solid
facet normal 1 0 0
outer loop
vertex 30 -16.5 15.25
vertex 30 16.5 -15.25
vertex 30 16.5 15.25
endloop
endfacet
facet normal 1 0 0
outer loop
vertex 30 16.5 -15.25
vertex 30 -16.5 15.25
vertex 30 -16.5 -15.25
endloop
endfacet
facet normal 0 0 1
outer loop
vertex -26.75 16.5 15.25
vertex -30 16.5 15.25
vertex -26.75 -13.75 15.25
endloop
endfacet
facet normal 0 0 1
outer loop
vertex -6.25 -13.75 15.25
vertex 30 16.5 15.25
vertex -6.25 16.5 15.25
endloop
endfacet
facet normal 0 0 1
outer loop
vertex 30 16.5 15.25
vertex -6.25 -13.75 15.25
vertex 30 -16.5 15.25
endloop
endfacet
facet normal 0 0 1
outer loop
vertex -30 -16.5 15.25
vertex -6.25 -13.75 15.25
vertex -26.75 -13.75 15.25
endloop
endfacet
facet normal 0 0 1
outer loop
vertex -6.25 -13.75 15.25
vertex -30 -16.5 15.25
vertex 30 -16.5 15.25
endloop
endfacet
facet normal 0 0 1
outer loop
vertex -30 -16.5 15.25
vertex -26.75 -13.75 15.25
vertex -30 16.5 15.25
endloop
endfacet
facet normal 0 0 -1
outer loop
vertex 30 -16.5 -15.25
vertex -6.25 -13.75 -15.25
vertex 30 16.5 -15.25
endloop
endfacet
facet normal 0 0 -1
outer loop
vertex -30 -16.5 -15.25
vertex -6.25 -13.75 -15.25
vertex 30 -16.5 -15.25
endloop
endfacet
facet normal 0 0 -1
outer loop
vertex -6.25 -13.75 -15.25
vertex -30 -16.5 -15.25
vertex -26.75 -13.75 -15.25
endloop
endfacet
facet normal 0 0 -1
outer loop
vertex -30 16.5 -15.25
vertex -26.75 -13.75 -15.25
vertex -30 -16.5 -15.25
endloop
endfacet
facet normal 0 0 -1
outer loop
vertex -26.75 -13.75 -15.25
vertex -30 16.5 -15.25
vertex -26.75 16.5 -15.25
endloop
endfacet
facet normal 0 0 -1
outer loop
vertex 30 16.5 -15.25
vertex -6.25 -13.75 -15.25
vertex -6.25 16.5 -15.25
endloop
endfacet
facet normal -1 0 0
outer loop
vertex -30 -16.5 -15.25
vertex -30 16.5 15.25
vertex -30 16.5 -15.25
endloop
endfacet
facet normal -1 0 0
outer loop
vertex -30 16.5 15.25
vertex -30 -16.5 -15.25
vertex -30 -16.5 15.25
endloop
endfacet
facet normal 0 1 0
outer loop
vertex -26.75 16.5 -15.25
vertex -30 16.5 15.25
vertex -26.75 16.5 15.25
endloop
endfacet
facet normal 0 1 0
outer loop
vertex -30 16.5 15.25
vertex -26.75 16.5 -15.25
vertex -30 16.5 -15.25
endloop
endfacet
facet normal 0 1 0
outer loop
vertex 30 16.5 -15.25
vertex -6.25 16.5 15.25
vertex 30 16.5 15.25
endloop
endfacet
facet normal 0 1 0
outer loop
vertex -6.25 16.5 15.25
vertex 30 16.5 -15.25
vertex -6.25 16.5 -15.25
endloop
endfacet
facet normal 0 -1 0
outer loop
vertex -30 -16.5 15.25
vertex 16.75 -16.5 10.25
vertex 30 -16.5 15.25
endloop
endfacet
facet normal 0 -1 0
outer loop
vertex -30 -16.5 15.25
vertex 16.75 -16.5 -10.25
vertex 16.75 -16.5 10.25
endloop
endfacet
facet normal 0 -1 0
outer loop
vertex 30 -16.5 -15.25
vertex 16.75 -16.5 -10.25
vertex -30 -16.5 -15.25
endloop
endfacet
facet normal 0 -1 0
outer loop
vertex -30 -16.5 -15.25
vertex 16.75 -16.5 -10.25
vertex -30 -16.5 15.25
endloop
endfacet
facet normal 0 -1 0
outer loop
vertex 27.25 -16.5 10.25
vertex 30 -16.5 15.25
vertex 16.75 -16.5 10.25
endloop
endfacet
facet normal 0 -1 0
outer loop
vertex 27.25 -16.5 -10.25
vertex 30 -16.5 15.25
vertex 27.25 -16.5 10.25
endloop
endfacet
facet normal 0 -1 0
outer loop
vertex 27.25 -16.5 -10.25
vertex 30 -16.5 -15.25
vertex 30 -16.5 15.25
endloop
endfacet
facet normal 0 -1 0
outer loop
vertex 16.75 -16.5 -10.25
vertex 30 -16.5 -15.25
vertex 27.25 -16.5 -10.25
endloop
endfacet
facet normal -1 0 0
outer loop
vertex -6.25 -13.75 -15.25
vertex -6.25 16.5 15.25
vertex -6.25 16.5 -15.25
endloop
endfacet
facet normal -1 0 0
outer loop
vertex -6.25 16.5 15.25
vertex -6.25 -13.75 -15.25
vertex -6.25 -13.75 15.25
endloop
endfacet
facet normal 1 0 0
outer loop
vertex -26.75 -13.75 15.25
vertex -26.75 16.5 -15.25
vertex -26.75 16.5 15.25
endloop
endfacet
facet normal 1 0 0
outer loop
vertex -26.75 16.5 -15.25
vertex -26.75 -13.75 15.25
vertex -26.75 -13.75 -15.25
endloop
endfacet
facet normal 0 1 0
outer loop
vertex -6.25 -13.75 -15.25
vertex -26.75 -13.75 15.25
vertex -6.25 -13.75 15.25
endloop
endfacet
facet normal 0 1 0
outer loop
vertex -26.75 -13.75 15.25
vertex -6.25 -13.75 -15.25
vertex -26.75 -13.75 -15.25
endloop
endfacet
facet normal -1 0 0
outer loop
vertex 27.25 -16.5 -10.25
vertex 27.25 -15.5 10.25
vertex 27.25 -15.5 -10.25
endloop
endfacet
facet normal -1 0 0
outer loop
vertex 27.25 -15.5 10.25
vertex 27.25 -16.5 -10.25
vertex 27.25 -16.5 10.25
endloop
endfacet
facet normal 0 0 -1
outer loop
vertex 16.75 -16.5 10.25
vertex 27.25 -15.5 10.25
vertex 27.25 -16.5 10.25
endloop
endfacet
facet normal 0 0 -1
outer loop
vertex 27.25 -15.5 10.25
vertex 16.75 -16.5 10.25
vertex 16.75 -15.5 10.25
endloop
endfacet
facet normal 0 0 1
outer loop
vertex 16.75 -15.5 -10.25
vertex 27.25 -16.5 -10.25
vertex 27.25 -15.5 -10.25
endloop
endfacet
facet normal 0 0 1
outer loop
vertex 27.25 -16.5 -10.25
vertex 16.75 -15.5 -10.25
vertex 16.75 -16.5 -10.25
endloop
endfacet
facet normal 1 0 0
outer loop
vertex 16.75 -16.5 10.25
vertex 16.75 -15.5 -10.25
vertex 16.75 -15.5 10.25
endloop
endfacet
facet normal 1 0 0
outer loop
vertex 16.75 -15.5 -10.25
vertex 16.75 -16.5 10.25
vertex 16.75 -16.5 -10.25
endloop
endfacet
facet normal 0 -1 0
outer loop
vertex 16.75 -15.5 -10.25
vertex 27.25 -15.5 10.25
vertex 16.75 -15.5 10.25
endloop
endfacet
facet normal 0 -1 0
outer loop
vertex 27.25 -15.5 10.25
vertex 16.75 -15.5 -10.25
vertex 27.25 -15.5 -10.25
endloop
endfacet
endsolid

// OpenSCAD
barWidth=20;
barHeight=30;

magnetLength=20;
magnetWidth=10;
magnetDepth=2;

difference() {
    cube([barWidth + 40, barHeight+3, barHeight+.5], true);   
    
    translate([-16.5, 1.5, 0])
    cube([barWidth+.5, barHeight+.5, barHeight+.5], true);    
 
    translate([22, -16.5, 0])
    cube([magnetWidth+.5, magnetDepth, magnetLength+.5], true);  
} 
